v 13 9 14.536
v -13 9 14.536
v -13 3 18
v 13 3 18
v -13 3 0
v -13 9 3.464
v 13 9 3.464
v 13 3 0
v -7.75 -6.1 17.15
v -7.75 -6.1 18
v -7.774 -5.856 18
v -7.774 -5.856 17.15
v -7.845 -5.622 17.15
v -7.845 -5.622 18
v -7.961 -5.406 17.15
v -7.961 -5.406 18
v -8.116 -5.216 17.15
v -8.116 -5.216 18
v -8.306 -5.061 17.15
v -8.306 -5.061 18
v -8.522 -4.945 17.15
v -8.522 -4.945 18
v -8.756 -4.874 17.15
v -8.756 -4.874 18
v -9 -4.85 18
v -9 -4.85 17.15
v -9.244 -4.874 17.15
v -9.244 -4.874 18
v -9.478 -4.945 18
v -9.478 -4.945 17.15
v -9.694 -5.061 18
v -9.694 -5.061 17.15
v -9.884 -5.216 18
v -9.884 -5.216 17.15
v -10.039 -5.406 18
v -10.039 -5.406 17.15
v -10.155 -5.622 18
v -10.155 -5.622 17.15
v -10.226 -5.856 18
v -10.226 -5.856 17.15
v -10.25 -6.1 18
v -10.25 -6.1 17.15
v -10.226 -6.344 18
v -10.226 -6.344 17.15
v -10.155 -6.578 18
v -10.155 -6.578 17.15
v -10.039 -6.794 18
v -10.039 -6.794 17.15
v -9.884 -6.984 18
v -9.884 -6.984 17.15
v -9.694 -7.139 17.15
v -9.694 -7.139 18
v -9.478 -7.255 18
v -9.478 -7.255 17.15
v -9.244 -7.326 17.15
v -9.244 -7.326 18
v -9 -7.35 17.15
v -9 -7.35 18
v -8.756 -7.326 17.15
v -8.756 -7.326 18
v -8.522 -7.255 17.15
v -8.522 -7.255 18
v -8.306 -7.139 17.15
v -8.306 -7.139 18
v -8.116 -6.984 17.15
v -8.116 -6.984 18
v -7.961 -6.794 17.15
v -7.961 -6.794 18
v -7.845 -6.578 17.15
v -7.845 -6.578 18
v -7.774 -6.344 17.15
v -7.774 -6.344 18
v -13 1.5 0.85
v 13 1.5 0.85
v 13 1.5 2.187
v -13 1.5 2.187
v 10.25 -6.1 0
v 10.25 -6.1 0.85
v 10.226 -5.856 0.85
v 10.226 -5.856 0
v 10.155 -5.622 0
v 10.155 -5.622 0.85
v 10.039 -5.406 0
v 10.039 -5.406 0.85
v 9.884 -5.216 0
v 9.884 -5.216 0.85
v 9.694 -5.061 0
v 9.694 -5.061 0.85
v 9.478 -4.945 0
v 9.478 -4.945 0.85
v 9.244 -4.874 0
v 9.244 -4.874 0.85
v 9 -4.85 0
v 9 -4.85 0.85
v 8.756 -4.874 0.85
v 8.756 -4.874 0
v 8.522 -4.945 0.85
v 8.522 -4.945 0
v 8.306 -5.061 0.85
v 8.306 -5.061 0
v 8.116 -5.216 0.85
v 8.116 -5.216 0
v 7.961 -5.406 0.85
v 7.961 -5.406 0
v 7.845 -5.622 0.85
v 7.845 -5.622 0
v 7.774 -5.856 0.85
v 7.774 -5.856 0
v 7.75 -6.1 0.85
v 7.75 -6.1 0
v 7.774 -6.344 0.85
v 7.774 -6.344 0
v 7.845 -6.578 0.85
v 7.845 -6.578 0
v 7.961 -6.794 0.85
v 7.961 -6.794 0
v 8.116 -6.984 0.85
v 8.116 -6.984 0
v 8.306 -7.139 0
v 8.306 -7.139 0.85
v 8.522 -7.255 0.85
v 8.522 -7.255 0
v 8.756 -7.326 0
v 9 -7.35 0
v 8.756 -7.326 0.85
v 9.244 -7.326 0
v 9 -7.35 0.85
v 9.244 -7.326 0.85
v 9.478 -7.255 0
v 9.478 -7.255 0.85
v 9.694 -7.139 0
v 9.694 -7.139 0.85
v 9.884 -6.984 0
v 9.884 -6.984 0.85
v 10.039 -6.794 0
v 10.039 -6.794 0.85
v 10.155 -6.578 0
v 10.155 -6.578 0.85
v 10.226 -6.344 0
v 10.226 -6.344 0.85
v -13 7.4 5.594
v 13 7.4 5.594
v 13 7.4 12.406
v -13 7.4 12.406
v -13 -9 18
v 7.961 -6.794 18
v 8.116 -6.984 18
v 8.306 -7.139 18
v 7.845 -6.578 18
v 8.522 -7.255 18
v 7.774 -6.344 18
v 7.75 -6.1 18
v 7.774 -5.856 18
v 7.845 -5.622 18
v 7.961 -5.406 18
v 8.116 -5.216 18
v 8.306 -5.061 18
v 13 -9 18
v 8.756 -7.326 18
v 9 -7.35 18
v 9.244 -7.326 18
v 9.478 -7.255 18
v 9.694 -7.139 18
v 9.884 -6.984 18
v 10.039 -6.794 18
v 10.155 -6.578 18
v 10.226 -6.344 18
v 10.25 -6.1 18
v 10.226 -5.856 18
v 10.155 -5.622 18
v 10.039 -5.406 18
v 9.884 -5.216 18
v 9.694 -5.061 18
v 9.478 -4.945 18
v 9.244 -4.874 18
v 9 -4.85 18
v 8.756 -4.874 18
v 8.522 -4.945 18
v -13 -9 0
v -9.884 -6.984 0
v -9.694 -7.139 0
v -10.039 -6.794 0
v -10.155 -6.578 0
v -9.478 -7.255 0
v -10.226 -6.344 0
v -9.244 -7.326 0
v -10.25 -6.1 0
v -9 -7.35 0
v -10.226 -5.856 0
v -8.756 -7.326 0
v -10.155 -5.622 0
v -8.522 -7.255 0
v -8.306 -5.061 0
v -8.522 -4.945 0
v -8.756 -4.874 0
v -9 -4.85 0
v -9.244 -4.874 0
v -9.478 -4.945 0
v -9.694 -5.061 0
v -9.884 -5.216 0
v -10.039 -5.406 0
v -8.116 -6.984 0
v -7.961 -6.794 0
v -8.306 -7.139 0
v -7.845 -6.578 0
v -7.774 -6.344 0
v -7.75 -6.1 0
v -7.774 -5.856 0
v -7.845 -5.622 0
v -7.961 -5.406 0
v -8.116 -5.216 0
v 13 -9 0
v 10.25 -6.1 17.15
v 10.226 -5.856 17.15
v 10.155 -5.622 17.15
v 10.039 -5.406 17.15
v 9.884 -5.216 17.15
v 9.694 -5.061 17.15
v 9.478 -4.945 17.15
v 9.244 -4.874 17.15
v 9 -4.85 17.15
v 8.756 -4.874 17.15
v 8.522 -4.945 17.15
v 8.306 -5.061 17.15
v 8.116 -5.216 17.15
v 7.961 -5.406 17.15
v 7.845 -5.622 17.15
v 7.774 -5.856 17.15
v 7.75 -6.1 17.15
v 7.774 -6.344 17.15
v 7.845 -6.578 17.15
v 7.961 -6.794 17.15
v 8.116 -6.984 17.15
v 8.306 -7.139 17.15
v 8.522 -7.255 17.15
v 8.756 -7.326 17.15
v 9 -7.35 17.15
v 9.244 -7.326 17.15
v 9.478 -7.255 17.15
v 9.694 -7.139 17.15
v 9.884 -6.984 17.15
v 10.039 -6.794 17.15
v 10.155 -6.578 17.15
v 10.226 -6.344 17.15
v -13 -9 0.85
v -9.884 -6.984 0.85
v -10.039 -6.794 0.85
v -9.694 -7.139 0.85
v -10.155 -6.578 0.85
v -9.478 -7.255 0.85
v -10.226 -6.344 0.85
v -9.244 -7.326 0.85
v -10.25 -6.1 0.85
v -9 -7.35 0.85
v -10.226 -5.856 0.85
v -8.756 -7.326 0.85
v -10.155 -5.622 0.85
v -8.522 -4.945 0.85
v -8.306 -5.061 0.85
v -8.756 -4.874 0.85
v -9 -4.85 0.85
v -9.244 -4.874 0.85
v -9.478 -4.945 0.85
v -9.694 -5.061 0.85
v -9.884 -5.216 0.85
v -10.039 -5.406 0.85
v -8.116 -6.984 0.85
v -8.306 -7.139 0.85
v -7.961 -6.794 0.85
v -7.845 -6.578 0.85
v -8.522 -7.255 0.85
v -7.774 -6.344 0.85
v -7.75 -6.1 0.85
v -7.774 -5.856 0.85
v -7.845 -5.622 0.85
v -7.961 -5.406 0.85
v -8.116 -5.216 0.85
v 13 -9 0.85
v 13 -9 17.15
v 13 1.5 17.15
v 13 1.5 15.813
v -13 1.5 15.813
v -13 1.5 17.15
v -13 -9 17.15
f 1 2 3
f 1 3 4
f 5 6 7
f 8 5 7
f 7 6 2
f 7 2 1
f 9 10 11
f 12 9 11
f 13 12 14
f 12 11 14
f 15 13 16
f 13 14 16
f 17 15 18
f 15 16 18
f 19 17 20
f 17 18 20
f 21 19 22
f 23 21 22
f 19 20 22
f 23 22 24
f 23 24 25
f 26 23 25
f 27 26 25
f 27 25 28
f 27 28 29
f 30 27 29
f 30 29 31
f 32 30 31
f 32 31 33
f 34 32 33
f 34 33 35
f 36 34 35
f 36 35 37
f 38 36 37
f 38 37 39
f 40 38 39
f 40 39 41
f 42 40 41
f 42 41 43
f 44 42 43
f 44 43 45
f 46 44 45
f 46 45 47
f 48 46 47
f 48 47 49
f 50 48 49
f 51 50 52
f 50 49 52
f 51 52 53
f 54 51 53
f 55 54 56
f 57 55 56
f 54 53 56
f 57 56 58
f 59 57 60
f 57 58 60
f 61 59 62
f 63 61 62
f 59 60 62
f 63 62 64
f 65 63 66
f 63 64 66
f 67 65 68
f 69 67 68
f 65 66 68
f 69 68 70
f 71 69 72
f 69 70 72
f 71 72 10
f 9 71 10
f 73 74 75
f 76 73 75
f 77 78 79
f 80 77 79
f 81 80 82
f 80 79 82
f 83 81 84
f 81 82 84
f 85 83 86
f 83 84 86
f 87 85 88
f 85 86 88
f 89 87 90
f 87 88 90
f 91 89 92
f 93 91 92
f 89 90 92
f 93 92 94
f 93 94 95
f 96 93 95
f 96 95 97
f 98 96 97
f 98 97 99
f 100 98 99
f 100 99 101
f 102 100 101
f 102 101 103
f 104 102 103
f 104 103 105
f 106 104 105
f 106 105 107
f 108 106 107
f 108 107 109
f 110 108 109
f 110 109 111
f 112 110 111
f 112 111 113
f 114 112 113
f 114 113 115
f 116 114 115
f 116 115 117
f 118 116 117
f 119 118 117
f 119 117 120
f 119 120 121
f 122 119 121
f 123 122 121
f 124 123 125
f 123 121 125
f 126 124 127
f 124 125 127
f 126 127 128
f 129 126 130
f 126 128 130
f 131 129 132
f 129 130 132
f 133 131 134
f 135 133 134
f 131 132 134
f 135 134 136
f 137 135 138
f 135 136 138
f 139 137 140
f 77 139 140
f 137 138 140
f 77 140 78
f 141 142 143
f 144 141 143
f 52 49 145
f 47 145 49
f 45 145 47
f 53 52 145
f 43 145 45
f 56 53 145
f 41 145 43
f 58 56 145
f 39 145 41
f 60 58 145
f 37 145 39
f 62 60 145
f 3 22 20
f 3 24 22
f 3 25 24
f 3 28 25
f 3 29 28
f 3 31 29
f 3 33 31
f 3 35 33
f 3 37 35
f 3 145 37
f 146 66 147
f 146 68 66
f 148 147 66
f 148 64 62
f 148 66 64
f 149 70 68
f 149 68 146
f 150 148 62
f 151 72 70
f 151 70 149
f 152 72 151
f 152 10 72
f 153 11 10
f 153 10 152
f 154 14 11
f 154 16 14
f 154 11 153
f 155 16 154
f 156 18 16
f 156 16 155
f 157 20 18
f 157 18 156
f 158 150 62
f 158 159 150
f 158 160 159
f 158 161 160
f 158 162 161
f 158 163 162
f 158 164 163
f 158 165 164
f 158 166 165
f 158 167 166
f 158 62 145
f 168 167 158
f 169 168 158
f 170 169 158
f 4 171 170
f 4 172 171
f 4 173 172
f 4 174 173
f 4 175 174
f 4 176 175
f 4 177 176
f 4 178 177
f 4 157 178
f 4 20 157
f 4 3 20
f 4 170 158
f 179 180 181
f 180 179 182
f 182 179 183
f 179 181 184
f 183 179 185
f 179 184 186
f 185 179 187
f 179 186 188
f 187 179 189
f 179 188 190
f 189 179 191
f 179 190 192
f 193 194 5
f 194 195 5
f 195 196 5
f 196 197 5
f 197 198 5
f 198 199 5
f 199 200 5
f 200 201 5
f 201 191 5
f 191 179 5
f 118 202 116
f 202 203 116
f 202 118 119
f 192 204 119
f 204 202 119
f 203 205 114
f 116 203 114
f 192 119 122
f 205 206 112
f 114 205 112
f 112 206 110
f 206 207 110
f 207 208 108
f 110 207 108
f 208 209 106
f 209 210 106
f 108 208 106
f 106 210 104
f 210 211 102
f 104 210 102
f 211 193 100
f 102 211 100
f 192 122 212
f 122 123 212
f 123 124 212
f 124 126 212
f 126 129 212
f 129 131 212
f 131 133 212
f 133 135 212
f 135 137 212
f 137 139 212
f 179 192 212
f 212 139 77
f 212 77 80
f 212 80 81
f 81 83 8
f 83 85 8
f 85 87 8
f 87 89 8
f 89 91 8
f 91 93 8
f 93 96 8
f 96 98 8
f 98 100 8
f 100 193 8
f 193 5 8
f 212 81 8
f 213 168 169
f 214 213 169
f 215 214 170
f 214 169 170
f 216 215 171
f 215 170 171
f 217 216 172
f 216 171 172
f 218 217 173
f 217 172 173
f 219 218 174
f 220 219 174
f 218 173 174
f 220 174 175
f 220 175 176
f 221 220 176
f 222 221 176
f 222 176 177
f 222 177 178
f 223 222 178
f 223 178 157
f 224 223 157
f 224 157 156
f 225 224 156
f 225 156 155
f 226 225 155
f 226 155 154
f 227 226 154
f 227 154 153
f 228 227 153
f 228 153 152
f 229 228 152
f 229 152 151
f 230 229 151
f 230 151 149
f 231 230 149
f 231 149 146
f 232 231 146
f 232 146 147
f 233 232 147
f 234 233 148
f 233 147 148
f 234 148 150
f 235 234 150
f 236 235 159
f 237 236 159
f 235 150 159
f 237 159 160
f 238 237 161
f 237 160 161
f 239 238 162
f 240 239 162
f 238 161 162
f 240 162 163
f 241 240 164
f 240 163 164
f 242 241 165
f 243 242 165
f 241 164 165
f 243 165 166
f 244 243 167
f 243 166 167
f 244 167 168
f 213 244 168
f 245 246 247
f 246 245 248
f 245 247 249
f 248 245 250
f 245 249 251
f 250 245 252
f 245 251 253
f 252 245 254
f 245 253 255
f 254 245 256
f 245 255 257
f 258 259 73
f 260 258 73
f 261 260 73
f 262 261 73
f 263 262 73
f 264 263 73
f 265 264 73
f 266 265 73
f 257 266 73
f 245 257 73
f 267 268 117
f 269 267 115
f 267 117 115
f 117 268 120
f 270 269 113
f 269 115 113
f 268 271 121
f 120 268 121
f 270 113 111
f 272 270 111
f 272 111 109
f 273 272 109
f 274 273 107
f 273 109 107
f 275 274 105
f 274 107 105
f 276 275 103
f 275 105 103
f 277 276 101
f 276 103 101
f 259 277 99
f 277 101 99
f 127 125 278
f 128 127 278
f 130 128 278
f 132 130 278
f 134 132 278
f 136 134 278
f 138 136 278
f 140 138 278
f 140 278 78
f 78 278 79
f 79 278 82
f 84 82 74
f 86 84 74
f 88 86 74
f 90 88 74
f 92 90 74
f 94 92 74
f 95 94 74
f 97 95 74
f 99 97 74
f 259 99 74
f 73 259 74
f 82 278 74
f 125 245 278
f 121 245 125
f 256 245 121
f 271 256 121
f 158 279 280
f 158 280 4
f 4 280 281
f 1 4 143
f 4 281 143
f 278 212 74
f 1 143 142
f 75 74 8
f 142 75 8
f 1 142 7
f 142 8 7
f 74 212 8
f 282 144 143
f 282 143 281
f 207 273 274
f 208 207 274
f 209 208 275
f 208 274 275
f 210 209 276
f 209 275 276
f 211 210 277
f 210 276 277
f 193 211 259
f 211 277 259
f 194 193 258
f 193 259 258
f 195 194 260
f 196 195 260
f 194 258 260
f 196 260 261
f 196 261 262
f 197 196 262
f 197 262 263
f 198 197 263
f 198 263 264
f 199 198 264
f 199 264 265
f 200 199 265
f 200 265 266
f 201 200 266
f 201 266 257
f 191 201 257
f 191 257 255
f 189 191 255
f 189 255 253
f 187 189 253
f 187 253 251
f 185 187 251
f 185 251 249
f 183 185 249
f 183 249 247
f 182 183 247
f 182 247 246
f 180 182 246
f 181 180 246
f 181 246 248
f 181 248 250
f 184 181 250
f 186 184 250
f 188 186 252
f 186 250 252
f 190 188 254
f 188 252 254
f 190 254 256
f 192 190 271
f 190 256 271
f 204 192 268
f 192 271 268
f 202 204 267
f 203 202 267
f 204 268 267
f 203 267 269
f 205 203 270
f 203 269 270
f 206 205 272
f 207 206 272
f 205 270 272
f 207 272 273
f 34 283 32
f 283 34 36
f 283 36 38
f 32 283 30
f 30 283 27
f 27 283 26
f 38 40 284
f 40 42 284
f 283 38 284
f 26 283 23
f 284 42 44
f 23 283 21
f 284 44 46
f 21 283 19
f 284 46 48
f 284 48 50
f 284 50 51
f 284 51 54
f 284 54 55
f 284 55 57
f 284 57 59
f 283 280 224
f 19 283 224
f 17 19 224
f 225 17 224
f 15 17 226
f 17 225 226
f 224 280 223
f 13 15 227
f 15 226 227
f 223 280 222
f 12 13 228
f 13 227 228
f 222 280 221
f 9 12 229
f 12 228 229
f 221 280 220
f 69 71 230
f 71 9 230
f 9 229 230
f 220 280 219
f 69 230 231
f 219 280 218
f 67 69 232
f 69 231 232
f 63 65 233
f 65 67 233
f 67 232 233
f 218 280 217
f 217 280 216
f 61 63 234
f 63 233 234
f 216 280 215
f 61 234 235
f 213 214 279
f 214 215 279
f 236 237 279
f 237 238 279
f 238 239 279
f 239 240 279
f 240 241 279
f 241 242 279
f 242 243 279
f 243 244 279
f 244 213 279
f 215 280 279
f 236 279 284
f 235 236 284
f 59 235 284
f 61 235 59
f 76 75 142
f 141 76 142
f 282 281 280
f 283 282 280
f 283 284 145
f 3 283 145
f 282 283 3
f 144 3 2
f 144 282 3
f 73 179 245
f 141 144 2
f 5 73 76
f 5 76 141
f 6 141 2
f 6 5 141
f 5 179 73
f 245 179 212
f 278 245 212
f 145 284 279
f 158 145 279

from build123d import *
from OCP.BRepFilletAPI import BRepFilletAPI_MakeChamfer

# Parameters (mm, degrees)
ESBO_O1_W                = 26
ESBO_O1_H                = 18
RESSALTO_EXTRUS_O1_DEPTH = 18
CORTE_EXTRUS_O1_DEPTH    = 33.878564446
ESBO_O3_R                = 1.25
CORTE_EXTRUS_O2_DEPTH    = 24.958297101
CHANFRO1_SIZE            = 6
CHANFRO1_SIZE2           = 3.464101615


with BuildPart() as part:
    # Esboço1 → Ressalto-extrusão1 (new body)
    with BuildSketch(Plane.XY):
        Rectangle(ESBO_O1_W, ESBO_O1_H)
    extrude(amount=RESSALTO_EXTRUS_O1_DEPTH)

    # Esboço2 → Corte-extrusão1 (cut, through all)
    with BuildSketch(Plane(origin=(13, 0, 0), x_dir=(0, 0, -1), z_dir=(1, 0, 0))):
        Polygon((-17.15, -9), (-0.85, -9), (-0.85, 1.5), (-2.187266824, 1.5), (-5.593633412, 7.4), (-12.406366588, 7.4), (-15.812733176, 1.5), (-17.15, 1.5), align=None)
    extrude(amount=-CORTE_EXTRUS_O1_DEPTH, mode=Mode.SUBTRACT)

    # Esboço3 → Corte-extrusão2 (cut, through all)
    with BuildSketch(Plane.XY.offset(18)):
        with Locations((-9, -6.1)):
            Circle(ESBO_O3_R)
        with Locations((9, -6.1)):
            Circle(ESBO_O3_R)
    extrude(amount=-CORTE_EXTRUS_O2_DEPTH, mode=Mode.SUBTRACT)

    # Chanfro1: one chamfer whose edges measure the first distance from different faces: ONE call of the kernel's chamfer builder (chamfer() names one face for all edges)
    chanfro1_edges_1 = [part.edges().sort_by_distance(p)[0] for p in [
        (0, 9, 0),
    ]]
    chanfro1_side_1 = [part.faces().sort_by_distance(p)[0] for p in [
        (0, 0.130704702, 0),
    ]]
    chanfro1_edges_2 = [part.edges().sort_by_distance(p)[0] for p in [
        (0, 9, 18),
    ]]
    chanfro1_side_2 = [part.faces().sort_by_distance(p)[0] for p in [
        (0, 0.130704702, 18),
    ]]
    chanfro1 = BRepFilletAPI_MakeChamfer(part.part.solid().wrapped)
    for e in chanfro1_edges_1:
        chanfro1.Add(CHANFRO1_SIZE, CHANFRO1_SIZE2, e.wrapped, chanfro1_side_1[0].wrapped)  # the first distance lies on this face
    for e in chanfro1_edges_2:
        chanfro1.Add(CHANFRO1_SIZE, CHANFRO1_SIZE2, e.wrapped, chanfro1_side_2[0].wrapped)  # the first distance lies on this face
    add(Compound.cast(chanfro1.Shape()), mode=Mode.REPLACE)


solid = part.part
